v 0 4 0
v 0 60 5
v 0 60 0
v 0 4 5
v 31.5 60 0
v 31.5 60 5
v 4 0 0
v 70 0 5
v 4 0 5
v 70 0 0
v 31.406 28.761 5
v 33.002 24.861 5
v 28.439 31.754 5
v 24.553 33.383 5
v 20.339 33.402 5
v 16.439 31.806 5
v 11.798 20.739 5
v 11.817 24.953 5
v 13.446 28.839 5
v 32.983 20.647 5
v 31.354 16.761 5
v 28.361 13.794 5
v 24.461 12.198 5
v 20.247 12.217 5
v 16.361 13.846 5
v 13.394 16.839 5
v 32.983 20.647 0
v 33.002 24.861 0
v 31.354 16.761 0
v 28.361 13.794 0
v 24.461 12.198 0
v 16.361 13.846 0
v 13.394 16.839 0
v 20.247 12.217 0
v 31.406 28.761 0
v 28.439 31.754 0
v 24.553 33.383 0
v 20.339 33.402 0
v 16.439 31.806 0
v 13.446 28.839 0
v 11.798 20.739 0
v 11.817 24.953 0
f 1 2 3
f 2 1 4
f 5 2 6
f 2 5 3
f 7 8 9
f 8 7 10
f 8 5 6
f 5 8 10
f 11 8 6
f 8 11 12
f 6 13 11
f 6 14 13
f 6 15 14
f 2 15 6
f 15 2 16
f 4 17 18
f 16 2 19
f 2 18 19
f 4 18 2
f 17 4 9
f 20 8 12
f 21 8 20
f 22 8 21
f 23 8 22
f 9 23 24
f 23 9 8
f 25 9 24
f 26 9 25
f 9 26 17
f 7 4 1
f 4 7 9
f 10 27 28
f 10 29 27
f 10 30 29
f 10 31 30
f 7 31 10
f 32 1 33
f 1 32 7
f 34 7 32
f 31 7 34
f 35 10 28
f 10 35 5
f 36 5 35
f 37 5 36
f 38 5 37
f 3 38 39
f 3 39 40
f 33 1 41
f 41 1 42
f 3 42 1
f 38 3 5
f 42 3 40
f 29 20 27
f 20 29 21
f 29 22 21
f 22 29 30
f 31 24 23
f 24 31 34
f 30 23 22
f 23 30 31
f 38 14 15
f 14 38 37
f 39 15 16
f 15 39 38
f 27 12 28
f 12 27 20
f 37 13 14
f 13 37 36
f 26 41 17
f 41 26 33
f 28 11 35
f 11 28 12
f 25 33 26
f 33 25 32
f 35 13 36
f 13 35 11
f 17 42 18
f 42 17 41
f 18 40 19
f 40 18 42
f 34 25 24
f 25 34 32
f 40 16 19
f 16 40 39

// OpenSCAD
$fn = 32;

// ----------------------------------------------------------------------
// Bracket plate: gusset 70 x 60
// ----------------------------------------------------------------------

// --- parameters (mm) ---
hole_r = 4;               // bolt hole radius
plate_t = 5;              // plate thickness, Z (extrusion height)
gus_a = 70;               // base length
gus_b = 60;               // height
top_x = 31.5;             // top edge X of the angled cut
light_r = 10.8;           // lightening hole radius

light_d = 2 * light_r;

profile = [[4, 0], [35, 0], [70, 0], [31.5, 60], [0, 60], [0, 4]];  // primary outline, 6 points, counter clockwise
void_1 = [[33.002, 24.861], [31.406, 28.761], [28.439, 31.754], [24.553, 33.383], [20.339, 33.402], [16.439, 31.806], [13.446, 28.839], [11.817, 24.953], [11.798, 20.739], [13.394, 16.839], [16.361, 13.846], [20.247, 12.217], [24.461, 12.198], [28.361, 13.794], [31.354, 16.761], [32.983, 20.647]];  // lightening hole, 16 points

// --- the one profile operation ---
difference() {
  linear_extrude(height = plate_t) polygon(points = profile);
  translate([0, 0, -1])
    linear_extrude(height = plate_t + 2) polygon(points = void_1);
}
